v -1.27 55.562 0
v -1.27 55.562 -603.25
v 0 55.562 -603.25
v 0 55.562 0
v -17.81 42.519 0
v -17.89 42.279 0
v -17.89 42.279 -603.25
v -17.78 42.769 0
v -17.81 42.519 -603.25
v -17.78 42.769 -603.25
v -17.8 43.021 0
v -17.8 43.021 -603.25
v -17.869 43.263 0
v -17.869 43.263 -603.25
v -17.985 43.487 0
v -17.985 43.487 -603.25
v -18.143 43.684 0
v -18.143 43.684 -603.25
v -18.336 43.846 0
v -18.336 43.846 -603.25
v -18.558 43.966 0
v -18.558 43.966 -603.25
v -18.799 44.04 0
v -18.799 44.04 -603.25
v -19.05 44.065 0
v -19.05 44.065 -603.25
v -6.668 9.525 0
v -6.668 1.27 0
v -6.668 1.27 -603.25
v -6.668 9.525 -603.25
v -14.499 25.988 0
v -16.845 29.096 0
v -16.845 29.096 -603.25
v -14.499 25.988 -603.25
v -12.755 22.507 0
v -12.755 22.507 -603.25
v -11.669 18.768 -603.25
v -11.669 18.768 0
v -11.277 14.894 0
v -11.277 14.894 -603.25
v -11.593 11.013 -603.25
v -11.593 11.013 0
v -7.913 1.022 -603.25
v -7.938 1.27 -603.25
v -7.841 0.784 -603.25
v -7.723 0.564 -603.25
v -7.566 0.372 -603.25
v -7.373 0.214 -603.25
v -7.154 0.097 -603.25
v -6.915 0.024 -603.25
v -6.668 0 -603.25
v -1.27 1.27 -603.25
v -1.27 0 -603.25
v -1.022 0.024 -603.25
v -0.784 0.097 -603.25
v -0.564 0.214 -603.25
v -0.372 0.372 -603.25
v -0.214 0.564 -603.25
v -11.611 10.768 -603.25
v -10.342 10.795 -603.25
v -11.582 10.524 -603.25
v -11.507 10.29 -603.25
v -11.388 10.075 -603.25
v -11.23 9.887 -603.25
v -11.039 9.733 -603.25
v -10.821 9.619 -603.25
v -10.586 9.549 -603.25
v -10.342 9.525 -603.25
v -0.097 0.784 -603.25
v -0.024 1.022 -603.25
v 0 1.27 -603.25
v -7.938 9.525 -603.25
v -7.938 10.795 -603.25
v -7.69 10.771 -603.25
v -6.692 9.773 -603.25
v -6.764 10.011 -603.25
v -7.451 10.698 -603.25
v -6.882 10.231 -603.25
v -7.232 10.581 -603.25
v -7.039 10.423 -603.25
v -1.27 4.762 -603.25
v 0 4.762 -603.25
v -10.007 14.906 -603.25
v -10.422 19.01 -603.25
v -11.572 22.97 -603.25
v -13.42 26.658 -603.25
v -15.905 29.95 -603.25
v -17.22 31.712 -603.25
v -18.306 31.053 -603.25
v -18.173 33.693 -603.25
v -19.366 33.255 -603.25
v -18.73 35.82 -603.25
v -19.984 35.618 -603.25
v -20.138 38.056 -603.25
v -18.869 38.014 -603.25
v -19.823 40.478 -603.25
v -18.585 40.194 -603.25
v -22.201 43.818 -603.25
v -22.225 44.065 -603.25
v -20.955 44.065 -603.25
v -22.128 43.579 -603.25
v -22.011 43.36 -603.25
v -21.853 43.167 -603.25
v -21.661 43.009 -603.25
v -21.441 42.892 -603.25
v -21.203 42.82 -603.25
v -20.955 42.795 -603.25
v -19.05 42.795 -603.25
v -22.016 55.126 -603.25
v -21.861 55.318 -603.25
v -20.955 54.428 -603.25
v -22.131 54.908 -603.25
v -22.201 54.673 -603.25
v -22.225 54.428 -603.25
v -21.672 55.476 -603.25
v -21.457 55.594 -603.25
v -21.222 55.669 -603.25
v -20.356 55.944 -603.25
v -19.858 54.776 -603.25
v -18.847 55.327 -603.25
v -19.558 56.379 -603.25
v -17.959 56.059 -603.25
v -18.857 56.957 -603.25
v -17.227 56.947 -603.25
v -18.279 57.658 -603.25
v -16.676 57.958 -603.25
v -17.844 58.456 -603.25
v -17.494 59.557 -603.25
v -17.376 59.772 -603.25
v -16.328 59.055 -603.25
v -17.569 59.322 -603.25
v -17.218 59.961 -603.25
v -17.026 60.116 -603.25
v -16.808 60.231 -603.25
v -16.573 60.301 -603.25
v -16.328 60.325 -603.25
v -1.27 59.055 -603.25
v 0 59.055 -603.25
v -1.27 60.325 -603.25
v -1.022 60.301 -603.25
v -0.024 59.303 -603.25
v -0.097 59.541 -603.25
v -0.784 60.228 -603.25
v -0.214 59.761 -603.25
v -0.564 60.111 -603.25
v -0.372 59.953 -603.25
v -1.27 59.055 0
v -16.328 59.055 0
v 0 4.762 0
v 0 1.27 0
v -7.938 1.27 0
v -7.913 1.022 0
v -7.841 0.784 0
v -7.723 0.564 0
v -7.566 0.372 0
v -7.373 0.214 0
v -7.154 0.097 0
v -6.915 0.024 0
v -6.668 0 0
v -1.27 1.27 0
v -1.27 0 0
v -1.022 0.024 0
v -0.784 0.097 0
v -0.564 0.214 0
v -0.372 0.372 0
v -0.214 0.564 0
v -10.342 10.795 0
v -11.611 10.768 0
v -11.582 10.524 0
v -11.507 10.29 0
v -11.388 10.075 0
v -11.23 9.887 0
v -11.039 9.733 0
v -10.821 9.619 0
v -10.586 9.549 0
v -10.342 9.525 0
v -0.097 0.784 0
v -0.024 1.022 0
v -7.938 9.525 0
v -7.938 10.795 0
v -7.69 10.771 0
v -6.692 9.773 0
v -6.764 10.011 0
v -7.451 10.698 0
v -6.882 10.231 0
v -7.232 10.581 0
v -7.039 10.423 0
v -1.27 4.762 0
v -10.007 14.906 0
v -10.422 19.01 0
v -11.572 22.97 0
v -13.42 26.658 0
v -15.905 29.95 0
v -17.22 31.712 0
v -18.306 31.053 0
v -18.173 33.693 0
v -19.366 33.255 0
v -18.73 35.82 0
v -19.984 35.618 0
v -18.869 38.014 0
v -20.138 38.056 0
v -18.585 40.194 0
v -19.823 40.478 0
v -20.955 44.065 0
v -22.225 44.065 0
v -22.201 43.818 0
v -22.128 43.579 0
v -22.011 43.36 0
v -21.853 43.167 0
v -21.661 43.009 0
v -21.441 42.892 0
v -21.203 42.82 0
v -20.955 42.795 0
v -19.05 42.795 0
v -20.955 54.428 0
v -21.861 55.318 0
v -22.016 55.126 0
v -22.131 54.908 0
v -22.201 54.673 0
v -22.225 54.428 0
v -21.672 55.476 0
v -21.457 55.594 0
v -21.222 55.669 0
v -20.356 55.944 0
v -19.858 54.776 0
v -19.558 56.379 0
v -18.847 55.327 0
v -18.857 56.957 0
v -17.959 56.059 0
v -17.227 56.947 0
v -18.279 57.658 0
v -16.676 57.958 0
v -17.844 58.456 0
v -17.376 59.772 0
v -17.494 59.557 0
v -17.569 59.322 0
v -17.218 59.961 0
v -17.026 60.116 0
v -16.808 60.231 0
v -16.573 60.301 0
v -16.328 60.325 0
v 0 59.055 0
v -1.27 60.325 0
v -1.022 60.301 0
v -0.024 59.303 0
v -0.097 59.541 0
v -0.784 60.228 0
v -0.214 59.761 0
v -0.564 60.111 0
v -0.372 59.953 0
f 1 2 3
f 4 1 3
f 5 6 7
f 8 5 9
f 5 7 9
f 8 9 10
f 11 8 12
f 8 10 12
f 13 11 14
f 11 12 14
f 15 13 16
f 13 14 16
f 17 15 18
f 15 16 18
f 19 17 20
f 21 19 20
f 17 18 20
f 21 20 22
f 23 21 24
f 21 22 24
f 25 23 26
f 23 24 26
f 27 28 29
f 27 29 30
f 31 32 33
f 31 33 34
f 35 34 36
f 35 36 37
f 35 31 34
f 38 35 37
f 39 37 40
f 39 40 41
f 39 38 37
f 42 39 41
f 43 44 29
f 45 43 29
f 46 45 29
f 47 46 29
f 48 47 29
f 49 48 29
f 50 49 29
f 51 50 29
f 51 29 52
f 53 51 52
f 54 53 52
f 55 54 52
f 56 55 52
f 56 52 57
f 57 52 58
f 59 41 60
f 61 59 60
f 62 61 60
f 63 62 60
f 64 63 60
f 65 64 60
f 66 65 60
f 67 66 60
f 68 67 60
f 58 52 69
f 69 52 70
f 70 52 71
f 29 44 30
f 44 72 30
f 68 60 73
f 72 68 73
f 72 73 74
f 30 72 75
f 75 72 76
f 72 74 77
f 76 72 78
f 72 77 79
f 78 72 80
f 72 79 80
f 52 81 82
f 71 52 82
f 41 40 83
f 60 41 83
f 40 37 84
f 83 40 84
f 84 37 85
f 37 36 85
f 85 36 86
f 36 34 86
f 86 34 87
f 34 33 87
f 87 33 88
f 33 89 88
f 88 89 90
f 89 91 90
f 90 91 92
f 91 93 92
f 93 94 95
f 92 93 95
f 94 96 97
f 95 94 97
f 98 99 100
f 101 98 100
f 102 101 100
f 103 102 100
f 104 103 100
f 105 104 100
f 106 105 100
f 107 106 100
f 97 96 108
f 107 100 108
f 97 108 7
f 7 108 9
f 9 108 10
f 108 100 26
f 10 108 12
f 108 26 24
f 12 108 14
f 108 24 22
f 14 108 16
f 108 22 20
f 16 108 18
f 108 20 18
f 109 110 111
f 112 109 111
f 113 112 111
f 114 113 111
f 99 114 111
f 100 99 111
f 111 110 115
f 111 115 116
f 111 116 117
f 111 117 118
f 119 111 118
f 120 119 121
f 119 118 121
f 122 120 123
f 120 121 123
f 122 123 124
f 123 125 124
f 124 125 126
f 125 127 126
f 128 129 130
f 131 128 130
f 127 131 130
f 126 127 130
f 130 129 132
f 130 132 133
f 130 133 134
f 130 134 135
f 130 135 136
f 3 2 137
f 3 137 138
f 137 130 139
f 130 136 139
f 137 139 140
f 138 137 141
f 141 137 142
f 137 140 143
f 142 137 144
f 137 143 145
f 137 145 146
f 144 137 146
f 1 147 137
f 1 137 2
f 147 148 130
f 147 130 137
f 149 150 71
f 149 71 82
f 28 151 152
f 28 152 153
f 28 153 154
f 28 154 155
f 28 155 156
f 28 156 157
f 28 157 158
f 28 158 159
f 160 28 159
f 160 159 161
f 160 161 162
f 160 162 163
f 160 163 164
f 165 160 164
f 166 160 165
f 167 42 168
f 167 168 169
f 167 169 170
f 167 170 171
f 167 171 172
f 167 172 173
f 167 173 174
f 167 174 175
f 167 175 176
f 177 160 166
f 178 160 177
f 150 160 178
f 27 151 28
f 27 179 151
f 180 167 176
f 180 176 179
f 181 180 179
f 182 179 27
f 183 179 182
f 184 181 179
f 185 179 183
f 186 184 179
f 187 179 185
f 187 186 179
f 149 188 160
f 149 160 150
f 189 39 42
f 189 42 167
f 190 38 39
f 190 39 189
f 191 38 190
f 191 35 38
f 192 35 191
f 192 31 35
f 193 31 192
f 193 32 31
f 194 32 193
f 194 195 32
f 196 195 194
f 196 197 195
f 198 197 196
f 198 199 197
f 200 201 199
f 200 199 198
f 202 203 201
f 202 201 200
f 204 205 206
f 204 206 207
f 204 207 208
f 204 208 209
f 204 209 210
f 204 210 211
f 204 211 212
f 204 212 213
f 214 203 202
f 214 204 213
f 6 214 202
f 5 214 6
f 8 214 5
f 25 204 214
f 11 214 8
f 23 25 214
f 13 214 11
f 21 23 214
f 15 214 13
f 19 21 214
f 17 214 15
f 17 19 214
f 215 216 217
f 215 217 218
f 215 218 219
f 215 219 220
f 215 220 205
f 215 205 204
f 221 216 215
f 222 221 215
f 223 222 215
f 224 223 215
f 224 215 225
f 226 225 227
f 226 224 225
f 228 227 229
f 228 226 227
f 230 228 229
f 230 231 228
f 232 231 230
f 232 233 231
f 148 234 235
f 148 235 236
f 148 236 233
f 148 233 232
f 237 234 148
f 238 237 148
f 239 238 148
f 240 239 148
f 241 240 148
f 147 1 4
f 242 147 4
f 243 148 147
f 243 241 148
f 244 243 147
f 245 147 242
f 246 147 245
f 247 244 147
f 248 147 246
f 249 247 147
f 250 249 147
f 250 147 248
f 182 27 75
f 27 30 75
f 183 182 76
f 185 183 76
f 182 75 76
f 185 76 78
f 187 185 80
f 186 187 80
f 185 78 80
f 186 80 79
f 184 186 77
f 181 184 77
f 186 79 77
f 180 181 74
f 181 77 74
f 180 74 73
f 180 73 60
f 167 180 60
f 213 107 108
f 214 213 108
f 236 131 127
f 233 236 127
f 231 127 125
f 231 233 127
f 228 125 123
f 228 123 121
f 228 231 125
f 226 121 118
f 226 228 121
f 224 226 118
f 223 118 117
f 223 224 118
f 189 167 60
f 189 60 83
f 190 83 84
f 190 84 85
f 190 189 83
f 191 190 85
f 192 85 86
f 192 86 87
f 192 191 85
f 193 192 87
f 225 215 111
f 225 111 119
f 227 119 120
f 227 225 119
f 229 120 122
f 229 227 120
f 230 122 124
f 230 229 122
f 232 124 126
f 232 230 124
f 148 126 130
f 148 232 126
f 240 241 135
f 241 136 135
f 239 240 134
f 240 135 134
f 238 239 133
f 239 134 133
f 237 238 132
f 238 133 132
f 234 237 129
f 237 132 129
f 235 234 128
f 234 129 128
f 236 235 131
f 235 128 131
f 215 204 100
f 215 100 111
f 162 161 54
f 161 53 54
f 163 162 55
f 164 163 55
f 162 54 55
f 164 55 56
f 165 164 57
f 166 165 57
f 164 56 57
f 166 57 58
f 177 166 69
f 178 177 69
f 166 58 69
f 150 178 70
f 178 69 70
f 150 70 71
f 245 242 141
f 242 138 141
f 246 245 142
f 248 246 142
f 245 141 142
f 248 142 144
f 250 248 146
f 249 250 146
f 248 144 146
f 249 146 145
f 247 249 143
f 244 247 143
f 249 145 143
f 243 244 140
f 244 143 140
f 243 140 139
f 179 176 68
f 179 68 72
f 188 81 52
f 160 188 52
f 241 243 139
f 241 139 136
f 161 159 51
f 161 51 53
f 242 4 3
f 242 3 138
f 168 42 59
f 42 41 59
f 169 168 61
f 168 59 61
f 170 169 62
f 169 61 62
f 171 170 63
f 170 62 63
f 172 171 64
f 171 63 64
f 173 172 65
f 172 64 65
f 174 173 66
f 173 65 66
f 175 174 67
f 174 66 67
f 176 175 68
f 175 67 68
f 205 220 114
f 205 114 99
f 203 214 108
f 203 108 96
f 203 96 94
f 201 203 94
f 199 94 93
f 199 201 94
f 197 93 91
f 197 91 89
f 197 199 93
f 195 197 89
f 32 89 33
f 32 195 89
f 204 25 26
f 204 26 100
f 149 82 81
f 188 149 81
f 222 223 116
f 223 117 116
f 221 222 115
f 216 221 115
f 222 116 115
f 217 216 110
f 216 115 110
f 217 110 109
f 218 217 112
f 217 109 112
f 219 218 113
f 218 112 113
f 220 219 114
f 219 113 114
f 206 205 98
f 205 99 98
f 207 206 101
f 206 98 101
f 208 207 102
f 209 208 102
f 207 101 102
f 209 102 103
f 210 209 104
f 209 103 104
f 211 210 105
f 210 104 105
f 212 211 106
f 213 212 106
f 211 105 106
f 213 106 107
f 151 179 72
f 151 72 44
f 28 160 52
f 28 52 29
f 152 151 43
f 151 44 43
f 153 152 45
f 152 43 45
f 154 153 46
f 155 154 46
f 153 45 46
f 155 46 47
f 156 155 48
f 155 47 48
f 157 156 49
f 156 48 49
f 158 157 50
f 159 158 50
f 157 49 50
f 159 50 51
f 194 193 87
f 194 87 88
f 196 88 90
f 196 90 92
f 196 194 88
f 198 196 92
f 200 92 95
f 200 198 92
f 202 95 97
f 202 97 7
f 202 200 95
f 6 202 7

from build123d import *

# Parameters (mm, degrees)
EXTRUDE_THIN1_DEPTH = 603.25
FILLET1_R           = 1.27


with BuildPart() as part:
    # Sketch1 → Extrude-Thin1 (new body)
    with BuildSketch(Plane.XY):
        with BuildLine():
            Line((0, 55.5625), (0, 60.325))
            Line((0, 60.325), (-17.4625, 60.325))
            ThreePointArc((-17.4625, 60.325), (-18.857403955, 56.957403955), (-22.225, 55.5625))
            Line((-22.225, 55.5625), (-22.225, 42.795329036))
            Line((-22.225, 42.795329036), (-19.05, 42.795329036))
            ThreePointArc((-19.05, 42.795329036), (-19.983849695, 35.617826147), (-16.845026643, 29.095831604))
            ThreePointArc((-16.845026643, 29.095831604), (-11.927389151, 19.928241149), (-11.90625, 9.525))
            Line((-11.90625, 9.525), (-7.9375, 9.525))
            Line((-7.9375, 9.525), (-7.9375, 0))
            Line((-7.9375, 0), (0, 0))
            Line((0, 0), (0, 4.7625))
            Line((0, 4.7625), (-1.27, 4.7625))
            Line((-1.27, 4.7625), (-1.27, 1.27))
            Line((-1.27, 1.27), (-6.6675, 1.27))
            Line((-6.6675, 1.27), (-6.6675, 10.795))
            Line((-6.6675, 10.795), (-10.341607608, 10.795))
            ThreePointArc((-10.341607608, 10.795), (-10.90685332, 21.016186768), (-15.905046277, 29.949843847))
            ThreePointArc((-15.905046277, 29.949843847), (-18.847187578, 36.835889429), (-16.895515947, 44.065329036))
            Line((-16.895515947, 44.065329036), (-20.955, 44.065329036))
            Line((-20.955, 44.065329036), (-20.955, 54.42769924))
            ThreePointArc((-20.955, 54.42769924), (-17.959378342, 56.059378342), (-16.32769924, 59.055))
            Line((-16.32769924, 59.055), (-1.27, 59.055))
            Line((-1.27, 59.055), (-1.27, 55.5625))
            Line((-1.27, 55.5625), (0, 55.5625))
        make_face()
    extrude(amount=-EXTRUDE_THIN1_DEPTH)

    # Fillet1
    fillet1_edges = [part.edges().sort_by_distance(p)[0] for p in [
        (0, 0, -301.625),
        (-7.9375, 0, -301.625),
        (-11.90625, 9.525, -301.625),
        (-22.225, 42.795329036, -301.625),
        (-22.225, 55.5625, -301.625),
        (-17.4625, 60.325, -301.625),
        (0, 60.325, -301.625),
        (-16.895515947, 44.065329036, -301.625),
        (-6.6675, 10.795, -301.625),
    ]]
    fillet(fillet1_edges, radius=FILLET1_R)


solid = part.part
